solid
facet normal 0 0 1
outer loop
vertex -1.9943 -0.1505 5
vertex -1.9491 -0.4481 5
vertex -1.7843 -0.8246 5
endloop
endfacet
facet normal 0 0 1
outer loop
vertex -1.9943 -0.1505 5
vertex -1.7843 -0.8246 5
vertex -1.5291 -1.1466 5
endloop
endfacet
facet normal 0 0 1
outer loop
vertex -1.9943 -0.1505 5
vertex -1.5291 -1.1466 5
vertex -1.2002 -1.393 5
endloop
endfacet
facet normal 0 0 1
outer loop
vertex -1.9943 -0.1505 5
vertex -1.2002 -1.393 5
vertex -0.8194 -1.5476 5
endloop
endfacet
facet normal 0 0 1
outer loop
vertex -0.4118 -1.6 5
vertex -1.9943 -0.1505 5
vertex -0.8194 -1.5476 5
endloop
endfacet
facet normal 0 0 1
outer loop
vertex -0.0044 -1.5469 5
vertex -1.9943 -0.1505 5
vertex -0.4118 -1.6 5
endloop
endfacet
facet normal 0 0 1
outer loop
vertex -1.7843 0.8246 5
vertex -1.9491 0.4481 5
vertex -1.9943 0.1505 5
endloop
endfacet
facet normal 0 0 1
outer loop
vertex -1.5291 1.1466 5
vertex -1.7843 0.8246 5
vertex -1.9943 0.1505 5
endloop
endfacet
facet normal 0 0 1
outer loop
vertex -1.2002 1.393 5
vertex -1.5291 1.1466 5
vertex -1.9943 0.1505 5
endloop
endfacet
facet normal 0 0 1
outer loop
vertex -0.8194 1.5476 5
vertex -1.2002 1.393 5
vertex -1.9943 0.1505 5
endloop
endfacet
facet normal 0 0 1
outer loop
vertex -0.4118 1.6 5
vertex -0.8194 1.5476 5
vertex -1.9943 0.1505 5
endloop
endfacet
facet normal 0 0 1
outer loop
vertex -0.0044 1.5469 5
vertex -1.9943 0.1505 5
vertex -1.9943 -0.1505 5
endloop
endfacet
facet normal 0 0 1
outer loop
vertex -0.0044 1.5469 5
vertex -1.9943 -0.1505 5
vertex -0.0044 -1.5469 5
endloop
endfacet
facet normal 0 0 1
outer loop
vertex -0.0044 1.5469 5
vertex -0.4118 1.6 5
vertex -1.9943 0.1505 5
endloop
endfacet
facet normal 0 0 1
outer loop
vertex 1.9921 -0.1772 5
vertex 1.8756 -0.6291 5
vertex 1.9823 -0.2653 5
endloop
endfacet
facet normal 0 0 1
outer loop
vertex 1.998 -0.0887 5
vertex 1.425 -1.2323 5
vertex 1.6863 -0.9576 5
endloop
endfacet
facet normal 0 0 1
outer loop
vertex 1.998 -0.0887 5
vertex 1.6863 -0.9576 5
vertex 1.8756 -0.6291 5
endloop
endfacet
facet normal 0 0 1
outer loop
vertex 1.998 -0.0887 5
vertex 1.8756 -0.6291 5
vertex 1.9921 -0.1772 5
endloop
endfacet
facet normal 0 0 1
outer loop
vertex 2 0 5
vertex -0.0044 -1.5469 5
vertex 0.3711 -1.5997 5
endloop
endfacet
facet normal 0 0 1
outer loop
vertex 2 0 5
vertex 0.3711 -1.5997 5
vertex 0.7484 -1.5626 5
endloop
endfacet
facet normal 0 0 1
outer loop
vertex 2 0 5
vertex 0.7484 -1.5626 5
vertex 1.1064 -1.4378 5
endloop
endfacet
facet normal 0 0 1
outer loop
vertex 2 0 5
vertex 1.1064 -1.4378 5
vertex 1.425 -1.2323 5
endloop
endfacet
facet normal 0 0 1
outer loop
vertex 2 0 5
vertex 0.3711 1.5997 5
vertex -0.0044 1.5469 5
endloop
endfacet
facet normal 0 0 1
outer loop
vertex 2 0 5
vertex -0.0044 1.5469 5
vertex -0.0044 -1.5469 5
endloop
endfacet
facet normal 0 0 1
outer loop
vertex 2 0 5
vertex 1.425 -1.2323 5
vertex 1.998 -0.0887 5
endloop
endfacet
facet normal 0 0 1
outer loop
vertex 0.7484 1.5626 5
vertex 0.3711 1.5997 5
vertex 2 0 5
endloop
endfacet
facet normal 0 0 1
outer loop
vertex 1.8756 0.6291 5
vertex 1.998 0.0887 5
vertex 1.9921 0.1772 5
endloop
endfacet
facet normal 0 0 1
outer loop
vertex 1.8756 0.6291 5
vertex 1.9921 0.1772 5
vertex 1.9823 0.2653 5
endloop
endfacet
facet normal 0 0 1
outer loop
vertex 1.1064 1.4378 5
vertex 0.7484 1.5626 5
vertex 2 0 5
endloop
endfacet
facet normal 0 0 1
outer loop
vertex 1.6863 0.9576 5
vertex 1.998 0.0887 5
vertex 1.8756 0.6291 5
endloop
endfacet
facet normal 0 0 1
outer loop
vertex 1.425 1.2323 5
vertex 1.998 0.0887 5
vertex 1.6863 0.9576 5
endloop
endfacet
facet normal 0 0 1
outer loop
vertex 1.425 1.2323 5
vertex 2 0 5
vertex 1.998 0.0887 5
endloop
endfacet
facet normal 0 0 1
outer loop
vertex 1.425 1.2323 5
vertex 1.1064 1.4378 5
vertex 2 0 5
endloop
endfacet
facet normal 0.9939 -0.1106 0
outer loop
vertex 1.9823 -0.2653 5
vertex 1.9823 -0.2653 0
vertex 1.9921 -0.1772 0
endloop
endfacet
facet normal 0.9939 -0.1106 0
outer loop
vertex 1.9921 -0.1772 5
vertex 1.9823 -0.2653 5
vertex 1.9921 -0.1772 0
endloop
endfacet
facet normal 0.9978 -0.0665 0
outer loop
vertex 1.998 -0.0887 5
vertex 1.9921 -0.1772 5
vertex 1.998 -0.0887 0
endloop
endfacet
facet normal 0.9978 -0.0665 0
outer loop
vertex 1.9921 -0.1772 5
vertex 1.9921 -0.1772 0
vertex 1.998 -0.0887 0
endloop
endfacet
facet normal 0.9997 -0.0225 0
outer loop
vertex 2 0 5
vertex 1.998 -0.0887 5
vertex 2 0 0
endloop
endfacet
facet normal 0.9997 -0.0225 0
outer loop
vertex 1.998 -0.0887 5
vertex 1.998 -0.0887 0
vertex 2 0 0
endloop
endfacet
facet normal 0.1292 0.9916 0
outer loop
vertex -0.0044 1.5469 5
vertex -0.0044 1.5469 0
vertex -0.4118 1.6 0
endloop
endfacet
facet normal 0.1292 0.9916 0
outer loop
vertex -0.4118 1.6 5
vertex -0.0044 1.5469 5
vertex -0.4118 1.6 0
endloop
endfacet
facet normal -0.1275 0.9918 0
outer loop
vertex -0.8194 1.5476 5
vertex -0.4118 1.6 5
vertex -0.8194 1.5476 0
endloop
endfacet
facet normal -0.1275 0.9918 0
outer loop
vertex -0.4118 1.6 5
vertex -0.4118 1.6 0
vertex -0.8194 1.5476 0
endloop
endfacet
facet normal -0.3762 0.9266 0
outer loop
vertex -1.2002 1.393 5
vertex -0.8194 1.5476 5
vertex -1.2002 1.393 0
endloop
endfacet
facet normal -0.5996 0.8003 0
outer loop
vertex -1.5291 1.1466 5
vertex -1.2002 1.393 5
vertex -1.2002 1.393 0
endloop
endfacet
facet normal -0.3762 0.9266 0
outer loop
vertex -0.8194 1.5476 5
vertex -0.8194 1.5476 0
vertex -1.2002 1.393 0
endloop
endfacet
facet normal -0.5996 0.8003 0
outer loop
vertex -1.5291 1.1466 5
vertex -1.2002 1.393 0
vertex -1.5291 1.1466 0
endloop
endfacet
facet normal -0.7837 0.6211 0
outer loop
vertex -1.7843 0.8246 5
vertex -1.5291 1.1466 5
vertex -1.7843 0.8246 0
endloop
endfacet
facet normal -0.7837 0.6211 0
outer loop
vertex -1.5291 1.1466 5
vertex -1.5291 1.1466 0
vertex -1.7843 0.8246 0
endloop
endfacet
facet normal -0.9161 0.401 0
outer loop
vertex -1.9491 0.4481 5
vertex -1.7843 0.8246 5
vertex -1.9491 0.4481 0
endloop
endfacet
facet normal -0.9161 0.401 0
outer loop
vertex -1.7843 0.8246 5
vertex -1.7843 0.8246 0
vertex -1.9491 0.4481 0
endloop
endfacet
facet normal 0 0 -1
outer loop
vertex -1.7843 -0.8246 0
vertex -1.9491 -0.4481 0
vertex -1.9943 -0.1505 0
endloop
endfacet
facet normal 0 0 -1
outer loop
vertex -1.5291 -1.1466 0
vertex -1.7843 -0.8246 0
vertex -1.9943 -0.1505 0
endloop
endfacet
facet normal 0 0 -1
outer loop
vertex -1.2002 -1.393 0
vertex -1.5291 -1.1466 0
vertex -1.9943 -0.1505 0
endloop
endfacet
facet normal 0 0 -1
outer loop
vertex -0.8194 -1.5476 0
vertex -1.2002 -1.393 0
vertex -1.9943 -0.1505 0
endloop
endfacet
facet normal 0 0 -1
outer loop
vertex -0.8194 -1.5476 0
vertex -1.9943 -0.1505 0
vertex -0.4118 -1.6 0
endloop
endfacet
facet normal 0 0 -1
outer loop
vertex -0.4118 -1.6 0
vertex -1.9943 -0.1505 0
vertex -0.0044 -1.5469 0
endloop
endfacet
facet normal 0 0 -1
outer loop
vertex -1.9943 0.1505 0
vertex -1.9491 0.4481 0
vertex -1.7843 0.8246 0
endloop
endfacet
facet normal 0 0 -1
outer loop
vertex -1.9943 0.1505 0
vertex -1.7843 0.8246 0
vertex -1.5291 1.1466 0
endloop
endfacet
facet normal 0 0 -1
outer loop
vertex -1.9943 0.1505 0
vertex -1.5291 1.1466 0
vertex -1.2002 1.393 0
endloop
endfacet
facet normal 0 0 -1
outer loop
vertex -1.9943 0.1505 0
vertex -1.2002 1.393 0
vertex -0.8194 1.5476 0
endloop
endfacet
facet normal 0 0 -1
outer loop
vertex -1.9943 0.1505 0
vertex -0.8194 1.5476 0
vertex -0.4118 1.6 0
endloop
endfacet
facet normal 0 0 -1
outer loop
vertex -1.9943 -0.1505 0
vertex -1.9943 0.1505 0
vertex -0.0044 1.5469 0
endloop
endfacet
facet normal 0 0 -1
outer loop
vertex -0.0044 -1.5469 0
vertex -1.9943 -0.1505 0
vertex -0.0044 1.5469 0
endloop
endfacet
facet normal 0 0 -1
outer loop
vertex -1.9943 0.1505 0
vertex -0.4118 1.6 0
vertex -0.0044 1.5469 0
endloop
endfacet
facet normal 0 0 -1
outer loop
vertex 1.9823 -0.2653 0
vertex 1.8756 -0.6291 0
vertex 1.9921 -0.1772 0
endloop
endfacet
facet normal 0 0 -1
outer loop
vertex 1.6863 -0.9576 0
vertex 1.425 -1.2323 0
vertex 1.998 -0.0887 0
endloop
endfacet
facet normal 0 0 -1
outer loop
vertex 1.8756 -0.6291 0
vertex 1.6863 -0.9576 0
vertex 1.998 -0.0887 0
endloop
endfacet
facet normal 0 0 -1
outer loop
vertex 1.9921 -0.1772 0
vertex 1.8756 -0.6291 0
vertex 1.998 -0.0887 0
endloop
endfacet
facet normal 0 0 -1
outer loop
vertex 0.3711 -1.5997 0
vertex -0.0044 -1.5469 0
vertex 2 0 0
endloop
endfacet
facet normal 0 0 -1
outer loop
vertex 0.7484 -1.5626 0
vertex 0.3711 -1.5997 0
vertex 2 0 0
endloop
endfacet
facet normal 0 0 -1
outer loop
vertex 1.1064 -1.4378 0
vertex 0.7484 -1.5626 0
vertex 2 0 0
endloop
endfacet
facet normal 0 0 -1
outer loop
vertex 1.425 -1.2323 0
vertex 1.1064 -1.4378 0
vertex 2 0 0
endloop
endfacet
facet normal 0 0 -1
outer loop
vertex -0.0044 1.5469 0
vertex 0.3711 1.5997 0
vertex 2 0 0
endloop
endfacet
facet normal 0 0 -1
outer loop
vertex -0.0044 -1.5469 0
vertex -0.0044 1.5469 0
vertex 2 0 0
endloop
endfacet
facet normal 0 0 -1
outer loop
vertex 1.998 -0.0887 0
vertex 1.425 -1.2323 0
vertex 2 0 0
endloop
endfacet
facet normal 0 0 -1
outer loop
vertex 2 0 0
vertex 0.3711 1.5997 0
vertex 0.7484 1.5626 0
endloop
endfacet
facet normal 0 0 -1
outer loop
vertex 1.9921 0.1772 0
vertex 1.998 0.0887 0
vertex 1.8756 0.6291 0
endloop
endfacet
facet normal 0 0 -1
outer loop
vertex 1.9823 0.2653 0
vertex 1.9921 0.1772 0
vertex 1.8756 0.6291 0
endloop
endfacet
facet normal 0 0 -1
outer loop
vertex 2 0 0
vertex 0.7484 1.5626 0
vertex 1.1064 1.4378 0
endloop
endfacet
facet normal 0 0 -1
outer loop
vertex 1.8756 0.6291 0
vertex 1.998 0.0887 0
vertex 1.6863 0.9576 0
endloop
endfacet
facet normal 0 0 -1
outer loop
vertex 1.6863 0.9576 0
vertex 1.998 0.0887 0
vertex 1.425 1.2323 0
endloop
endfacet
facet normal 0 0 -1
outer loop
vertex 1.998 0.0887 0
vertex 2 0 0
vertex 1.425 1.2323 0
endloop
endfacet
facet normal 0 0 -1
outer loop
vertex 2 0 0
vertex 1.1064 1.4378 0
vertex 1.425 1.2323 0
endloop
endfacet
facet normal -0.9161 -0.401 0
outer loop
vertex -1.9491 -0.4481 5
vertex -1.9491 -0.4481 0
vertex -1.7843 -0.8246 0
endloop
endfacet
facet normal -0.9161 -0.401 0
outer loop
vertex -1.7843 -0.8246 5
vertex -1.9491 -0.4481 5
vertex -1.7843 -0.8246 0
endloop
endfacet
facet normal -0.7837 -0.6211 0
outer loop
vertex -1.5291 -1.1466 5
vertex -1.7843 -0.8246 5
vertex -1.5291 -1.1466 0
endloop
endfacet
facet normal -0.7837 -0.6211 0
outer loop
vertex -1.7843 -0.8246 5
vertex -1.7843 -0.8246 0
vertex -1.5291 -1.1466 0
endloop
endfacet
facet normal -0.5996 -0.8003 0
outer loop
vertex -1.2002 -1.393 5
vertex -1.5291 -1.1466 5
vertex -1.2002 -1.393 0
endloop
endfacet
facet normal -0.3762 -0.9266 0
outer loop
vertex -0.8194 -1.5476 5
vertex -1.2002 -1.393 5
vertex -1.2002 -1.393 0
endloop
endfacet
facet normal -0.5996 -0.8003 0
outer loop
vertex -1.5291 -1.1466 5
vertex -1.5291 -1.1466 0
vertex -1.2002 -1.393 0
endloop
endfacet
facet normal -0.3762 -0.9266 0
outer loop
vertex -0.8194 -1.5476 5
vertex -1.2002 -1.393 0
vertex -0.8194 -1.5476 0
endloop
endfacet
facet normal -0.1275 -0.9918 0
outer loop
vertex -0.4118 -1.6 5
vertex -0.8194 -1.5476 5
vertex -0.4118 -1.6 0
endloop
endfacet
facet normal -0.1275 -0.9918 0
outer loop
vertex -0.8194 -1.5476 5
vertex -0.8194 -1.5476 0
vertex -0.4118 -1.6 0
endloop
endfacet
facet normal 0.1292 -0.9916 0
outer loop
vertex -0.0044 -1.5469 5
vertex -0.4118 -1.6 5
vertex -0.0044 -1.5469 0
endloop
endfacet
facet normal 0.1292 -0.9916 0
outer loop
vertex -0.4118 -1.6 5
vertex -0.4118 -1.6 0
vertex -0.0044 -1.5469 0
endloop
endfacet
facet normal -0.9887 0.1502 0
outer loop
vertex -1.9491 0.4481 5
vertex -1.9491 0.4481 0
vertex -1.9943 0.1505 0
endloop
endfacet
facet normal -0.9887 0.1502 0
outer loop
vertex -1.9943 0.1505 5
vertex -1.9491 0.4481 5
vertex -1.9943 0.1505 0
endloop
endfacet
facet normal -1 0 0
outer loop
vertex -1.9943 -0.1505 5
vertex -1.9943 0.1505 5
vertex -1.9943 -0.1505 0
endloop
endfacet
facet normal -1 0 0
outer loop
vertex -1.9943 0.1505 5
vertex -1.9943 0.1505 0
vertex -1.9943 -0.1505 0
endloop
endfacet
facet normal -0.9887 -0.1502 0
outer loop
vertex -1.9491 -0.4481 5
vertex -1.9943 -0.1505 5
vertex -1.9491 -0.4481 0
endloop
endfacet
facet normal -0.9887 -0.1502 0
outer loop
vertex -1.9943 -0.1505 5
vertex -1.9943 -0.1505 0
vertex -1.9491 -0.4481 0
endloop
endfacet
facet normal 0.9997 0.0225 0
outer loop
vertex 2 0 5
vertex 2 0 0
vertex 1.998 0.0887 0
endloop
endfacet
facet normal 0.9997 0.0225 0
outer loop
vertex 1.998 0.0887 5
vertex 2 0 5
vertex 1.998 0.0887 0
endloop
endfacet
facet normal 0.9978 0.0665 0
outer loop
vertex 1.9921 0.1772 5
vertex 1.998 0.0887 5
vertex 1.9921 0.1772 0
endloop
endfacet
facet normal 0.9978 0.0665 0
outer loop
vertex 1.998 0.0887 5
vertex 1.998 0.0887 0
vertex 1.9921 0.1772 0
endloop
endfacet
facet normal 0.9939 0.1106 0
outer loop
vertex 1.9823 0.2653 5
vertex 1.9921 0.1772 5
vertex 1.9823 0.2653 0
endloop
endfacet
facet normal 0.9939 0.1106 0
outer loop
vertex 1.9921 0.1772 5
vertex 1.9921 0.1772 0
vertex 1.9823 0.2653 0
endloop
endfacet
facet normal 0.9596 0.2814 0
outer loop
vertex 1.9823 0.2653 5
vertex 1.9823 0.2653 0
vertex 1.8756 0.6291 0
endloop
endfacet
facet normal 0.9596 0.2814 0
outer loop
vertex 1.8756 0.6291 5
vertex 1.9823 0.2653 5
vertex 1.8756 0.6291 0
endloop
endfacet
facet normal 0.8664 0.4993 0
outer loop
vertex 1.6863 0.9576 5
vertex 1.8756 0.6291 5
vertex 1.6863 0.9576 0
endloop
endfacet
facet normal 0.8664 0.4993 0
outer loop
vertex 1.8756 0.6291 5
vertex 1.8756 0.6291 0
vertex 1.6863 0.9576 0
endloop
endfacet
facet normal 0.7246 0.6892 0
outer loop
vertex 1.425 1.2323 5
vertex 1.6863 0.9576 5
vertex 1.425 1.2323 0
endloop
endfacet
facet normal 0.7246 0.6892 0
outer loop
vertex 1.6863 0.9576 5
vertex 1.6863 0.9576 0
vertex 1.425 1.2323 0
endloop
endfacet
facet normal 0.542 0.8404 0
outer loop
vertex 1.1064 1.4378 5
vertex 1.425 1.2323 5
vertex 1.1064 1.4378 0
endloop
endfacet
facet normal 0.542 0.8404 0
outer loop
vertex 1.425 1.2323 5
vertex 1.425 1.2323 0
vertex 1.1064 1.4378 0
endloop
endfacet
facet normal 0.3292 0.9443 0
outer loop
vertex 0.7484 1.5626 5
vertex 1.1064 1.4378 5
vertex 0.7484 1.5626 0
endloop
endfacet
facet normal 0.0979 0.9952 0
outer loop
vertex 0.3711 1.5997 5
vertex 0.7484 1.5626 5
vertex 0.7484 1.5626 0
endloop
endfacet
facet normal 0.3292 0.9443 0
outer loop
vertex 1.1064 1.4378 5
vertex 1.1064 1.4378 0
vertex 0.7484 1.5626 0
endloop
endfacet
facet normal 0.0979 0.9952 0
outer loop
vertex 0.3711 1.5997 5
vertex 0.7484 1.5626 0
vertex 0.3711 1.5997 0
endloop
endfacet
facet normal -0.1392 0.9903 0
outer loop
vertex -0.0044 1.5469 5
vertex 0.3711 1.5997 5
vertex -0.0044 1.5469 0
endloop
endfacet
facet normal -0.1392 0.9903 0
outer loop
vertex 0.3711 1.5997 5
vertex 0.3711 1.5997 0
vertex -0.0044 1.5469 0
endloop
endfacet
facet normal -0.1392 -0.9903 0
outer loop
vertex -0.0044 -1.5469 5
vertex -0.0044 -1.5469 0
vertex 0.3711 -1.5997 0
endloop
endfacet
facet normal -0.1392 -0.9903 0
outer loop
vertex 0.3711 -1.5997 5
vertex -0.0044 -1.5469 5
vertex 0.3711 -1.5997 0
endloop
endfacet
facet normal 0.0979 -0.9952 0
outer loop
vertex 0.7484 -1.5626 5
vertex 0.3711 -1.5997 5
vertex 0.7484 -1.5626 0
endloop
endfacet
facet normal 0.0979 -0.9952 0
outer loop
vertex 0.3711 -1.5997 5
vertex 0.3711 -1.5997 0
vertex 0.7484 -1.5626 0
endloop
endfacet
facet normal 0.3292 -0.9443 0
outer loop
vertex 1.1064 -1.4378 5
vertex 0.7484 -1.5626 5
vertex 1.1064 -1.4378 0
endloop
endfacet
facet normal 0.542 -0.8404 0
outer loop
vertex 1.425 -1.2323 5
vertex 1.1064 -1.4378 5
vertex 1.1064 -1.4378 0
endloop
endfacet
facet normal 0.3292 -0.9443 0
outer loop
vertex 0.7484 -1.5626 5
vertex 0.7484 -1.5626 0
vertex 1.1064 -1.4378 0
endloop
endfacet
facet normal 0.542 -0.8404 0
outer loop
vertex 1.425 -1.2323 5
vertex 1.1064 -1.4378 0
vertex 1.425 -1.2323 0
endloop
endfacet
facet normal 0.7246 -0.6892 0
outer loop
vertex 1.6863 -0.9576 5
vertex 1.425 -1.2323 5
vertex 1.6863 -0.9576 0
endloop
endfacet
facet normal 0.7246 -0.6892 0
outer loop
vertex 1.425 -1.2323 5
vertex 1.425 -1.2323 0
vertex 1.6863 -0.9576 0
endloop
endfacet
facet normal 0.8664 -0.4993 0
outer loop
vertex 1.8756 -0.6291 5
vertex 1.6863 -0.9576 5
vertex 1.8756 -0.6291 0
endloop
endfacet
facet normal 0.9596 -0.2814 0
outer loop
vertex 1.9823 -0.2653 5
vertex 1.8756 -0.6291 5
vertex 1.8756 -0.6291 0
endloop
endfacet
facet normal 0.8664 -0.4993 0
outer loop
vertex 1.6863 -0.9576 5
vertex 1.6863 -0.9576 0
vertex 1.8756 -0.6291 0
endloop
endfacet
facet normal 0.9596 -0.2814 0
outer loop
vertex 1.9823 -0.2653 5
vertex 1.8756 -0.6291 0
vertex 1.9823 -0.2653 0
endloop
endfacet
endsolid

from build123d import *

# Parameters (mm, degrees)
F1_DEPTH = 5


with BuildPart() as f1:
    # F0 (on Top) → F1 (new body)
    with BuildSketch(Plane.XY):
        with BuildLine():
            ThreePointArc((-0.0043557084, 1.54688619), (-1.2002151566, 1.3930494801), (-1.9491454944, 0.4481426579))
            ThreePointArc((-1.9491454944, 0.4481426579), (-2, 0), (-1.9491454944, -0.4481426579))
            ThreePointArc((-1.9491454944, -0.4481426579), (-1.2002151566, -1.3930494801), (-0.0043557084, -1.54688619))
            ThreePointArc((-0.0043557084, -1.54688619), (-1.1955243066, 0), (-0.0043557084, 1.54688619))
        make_face()
        with BuildLine():
            ThreePointArc((1.1868128899, 0), (0.8545136122, 0.9761838344), (-0.0043557084, 1.54688619))
            ThreePointArc((-0.0043557084, 1.54688619), (-1.1955243066, 0), (-0.0043557084, -1.54688619))
            ThreePointArc((-0.0043557084, -1.54688619), (0.8545136122, -0.9761838344), (1.1868128899, 0))
        make_face()
        with BuildLine():
            ThreePointArc((1.982320091, -0.2653432812), (1.9955751279, -0.132965819), (2, 0))
            ThreePointArc((2, 0), (1.9955751279, 0.132965819), (1.982320091, 0.2653432812))
            ThreePointArc((1.982320091, 0.2653432812), (1.2717910356, 1.3445311811), (-0.0043557084, 1.54688619))
            ThreePointArc((-0.0043557084, 1.54688619), (0.8545136122, 0.9761838344), (1.1868128899, 0))
            ThreePointArc((1.1868128899, 0), (0.8545136122, -0.9761838344), (-0.0043557084, -1.54688619))
            ThreePointArc((-0.0043557084, -1.54688619), (1.2717910356, -1.3445311811), (1.982320091, -0.2653432812))
        make_face()
    extrude(amount=F1_DEPTH)


solid = f1.part
